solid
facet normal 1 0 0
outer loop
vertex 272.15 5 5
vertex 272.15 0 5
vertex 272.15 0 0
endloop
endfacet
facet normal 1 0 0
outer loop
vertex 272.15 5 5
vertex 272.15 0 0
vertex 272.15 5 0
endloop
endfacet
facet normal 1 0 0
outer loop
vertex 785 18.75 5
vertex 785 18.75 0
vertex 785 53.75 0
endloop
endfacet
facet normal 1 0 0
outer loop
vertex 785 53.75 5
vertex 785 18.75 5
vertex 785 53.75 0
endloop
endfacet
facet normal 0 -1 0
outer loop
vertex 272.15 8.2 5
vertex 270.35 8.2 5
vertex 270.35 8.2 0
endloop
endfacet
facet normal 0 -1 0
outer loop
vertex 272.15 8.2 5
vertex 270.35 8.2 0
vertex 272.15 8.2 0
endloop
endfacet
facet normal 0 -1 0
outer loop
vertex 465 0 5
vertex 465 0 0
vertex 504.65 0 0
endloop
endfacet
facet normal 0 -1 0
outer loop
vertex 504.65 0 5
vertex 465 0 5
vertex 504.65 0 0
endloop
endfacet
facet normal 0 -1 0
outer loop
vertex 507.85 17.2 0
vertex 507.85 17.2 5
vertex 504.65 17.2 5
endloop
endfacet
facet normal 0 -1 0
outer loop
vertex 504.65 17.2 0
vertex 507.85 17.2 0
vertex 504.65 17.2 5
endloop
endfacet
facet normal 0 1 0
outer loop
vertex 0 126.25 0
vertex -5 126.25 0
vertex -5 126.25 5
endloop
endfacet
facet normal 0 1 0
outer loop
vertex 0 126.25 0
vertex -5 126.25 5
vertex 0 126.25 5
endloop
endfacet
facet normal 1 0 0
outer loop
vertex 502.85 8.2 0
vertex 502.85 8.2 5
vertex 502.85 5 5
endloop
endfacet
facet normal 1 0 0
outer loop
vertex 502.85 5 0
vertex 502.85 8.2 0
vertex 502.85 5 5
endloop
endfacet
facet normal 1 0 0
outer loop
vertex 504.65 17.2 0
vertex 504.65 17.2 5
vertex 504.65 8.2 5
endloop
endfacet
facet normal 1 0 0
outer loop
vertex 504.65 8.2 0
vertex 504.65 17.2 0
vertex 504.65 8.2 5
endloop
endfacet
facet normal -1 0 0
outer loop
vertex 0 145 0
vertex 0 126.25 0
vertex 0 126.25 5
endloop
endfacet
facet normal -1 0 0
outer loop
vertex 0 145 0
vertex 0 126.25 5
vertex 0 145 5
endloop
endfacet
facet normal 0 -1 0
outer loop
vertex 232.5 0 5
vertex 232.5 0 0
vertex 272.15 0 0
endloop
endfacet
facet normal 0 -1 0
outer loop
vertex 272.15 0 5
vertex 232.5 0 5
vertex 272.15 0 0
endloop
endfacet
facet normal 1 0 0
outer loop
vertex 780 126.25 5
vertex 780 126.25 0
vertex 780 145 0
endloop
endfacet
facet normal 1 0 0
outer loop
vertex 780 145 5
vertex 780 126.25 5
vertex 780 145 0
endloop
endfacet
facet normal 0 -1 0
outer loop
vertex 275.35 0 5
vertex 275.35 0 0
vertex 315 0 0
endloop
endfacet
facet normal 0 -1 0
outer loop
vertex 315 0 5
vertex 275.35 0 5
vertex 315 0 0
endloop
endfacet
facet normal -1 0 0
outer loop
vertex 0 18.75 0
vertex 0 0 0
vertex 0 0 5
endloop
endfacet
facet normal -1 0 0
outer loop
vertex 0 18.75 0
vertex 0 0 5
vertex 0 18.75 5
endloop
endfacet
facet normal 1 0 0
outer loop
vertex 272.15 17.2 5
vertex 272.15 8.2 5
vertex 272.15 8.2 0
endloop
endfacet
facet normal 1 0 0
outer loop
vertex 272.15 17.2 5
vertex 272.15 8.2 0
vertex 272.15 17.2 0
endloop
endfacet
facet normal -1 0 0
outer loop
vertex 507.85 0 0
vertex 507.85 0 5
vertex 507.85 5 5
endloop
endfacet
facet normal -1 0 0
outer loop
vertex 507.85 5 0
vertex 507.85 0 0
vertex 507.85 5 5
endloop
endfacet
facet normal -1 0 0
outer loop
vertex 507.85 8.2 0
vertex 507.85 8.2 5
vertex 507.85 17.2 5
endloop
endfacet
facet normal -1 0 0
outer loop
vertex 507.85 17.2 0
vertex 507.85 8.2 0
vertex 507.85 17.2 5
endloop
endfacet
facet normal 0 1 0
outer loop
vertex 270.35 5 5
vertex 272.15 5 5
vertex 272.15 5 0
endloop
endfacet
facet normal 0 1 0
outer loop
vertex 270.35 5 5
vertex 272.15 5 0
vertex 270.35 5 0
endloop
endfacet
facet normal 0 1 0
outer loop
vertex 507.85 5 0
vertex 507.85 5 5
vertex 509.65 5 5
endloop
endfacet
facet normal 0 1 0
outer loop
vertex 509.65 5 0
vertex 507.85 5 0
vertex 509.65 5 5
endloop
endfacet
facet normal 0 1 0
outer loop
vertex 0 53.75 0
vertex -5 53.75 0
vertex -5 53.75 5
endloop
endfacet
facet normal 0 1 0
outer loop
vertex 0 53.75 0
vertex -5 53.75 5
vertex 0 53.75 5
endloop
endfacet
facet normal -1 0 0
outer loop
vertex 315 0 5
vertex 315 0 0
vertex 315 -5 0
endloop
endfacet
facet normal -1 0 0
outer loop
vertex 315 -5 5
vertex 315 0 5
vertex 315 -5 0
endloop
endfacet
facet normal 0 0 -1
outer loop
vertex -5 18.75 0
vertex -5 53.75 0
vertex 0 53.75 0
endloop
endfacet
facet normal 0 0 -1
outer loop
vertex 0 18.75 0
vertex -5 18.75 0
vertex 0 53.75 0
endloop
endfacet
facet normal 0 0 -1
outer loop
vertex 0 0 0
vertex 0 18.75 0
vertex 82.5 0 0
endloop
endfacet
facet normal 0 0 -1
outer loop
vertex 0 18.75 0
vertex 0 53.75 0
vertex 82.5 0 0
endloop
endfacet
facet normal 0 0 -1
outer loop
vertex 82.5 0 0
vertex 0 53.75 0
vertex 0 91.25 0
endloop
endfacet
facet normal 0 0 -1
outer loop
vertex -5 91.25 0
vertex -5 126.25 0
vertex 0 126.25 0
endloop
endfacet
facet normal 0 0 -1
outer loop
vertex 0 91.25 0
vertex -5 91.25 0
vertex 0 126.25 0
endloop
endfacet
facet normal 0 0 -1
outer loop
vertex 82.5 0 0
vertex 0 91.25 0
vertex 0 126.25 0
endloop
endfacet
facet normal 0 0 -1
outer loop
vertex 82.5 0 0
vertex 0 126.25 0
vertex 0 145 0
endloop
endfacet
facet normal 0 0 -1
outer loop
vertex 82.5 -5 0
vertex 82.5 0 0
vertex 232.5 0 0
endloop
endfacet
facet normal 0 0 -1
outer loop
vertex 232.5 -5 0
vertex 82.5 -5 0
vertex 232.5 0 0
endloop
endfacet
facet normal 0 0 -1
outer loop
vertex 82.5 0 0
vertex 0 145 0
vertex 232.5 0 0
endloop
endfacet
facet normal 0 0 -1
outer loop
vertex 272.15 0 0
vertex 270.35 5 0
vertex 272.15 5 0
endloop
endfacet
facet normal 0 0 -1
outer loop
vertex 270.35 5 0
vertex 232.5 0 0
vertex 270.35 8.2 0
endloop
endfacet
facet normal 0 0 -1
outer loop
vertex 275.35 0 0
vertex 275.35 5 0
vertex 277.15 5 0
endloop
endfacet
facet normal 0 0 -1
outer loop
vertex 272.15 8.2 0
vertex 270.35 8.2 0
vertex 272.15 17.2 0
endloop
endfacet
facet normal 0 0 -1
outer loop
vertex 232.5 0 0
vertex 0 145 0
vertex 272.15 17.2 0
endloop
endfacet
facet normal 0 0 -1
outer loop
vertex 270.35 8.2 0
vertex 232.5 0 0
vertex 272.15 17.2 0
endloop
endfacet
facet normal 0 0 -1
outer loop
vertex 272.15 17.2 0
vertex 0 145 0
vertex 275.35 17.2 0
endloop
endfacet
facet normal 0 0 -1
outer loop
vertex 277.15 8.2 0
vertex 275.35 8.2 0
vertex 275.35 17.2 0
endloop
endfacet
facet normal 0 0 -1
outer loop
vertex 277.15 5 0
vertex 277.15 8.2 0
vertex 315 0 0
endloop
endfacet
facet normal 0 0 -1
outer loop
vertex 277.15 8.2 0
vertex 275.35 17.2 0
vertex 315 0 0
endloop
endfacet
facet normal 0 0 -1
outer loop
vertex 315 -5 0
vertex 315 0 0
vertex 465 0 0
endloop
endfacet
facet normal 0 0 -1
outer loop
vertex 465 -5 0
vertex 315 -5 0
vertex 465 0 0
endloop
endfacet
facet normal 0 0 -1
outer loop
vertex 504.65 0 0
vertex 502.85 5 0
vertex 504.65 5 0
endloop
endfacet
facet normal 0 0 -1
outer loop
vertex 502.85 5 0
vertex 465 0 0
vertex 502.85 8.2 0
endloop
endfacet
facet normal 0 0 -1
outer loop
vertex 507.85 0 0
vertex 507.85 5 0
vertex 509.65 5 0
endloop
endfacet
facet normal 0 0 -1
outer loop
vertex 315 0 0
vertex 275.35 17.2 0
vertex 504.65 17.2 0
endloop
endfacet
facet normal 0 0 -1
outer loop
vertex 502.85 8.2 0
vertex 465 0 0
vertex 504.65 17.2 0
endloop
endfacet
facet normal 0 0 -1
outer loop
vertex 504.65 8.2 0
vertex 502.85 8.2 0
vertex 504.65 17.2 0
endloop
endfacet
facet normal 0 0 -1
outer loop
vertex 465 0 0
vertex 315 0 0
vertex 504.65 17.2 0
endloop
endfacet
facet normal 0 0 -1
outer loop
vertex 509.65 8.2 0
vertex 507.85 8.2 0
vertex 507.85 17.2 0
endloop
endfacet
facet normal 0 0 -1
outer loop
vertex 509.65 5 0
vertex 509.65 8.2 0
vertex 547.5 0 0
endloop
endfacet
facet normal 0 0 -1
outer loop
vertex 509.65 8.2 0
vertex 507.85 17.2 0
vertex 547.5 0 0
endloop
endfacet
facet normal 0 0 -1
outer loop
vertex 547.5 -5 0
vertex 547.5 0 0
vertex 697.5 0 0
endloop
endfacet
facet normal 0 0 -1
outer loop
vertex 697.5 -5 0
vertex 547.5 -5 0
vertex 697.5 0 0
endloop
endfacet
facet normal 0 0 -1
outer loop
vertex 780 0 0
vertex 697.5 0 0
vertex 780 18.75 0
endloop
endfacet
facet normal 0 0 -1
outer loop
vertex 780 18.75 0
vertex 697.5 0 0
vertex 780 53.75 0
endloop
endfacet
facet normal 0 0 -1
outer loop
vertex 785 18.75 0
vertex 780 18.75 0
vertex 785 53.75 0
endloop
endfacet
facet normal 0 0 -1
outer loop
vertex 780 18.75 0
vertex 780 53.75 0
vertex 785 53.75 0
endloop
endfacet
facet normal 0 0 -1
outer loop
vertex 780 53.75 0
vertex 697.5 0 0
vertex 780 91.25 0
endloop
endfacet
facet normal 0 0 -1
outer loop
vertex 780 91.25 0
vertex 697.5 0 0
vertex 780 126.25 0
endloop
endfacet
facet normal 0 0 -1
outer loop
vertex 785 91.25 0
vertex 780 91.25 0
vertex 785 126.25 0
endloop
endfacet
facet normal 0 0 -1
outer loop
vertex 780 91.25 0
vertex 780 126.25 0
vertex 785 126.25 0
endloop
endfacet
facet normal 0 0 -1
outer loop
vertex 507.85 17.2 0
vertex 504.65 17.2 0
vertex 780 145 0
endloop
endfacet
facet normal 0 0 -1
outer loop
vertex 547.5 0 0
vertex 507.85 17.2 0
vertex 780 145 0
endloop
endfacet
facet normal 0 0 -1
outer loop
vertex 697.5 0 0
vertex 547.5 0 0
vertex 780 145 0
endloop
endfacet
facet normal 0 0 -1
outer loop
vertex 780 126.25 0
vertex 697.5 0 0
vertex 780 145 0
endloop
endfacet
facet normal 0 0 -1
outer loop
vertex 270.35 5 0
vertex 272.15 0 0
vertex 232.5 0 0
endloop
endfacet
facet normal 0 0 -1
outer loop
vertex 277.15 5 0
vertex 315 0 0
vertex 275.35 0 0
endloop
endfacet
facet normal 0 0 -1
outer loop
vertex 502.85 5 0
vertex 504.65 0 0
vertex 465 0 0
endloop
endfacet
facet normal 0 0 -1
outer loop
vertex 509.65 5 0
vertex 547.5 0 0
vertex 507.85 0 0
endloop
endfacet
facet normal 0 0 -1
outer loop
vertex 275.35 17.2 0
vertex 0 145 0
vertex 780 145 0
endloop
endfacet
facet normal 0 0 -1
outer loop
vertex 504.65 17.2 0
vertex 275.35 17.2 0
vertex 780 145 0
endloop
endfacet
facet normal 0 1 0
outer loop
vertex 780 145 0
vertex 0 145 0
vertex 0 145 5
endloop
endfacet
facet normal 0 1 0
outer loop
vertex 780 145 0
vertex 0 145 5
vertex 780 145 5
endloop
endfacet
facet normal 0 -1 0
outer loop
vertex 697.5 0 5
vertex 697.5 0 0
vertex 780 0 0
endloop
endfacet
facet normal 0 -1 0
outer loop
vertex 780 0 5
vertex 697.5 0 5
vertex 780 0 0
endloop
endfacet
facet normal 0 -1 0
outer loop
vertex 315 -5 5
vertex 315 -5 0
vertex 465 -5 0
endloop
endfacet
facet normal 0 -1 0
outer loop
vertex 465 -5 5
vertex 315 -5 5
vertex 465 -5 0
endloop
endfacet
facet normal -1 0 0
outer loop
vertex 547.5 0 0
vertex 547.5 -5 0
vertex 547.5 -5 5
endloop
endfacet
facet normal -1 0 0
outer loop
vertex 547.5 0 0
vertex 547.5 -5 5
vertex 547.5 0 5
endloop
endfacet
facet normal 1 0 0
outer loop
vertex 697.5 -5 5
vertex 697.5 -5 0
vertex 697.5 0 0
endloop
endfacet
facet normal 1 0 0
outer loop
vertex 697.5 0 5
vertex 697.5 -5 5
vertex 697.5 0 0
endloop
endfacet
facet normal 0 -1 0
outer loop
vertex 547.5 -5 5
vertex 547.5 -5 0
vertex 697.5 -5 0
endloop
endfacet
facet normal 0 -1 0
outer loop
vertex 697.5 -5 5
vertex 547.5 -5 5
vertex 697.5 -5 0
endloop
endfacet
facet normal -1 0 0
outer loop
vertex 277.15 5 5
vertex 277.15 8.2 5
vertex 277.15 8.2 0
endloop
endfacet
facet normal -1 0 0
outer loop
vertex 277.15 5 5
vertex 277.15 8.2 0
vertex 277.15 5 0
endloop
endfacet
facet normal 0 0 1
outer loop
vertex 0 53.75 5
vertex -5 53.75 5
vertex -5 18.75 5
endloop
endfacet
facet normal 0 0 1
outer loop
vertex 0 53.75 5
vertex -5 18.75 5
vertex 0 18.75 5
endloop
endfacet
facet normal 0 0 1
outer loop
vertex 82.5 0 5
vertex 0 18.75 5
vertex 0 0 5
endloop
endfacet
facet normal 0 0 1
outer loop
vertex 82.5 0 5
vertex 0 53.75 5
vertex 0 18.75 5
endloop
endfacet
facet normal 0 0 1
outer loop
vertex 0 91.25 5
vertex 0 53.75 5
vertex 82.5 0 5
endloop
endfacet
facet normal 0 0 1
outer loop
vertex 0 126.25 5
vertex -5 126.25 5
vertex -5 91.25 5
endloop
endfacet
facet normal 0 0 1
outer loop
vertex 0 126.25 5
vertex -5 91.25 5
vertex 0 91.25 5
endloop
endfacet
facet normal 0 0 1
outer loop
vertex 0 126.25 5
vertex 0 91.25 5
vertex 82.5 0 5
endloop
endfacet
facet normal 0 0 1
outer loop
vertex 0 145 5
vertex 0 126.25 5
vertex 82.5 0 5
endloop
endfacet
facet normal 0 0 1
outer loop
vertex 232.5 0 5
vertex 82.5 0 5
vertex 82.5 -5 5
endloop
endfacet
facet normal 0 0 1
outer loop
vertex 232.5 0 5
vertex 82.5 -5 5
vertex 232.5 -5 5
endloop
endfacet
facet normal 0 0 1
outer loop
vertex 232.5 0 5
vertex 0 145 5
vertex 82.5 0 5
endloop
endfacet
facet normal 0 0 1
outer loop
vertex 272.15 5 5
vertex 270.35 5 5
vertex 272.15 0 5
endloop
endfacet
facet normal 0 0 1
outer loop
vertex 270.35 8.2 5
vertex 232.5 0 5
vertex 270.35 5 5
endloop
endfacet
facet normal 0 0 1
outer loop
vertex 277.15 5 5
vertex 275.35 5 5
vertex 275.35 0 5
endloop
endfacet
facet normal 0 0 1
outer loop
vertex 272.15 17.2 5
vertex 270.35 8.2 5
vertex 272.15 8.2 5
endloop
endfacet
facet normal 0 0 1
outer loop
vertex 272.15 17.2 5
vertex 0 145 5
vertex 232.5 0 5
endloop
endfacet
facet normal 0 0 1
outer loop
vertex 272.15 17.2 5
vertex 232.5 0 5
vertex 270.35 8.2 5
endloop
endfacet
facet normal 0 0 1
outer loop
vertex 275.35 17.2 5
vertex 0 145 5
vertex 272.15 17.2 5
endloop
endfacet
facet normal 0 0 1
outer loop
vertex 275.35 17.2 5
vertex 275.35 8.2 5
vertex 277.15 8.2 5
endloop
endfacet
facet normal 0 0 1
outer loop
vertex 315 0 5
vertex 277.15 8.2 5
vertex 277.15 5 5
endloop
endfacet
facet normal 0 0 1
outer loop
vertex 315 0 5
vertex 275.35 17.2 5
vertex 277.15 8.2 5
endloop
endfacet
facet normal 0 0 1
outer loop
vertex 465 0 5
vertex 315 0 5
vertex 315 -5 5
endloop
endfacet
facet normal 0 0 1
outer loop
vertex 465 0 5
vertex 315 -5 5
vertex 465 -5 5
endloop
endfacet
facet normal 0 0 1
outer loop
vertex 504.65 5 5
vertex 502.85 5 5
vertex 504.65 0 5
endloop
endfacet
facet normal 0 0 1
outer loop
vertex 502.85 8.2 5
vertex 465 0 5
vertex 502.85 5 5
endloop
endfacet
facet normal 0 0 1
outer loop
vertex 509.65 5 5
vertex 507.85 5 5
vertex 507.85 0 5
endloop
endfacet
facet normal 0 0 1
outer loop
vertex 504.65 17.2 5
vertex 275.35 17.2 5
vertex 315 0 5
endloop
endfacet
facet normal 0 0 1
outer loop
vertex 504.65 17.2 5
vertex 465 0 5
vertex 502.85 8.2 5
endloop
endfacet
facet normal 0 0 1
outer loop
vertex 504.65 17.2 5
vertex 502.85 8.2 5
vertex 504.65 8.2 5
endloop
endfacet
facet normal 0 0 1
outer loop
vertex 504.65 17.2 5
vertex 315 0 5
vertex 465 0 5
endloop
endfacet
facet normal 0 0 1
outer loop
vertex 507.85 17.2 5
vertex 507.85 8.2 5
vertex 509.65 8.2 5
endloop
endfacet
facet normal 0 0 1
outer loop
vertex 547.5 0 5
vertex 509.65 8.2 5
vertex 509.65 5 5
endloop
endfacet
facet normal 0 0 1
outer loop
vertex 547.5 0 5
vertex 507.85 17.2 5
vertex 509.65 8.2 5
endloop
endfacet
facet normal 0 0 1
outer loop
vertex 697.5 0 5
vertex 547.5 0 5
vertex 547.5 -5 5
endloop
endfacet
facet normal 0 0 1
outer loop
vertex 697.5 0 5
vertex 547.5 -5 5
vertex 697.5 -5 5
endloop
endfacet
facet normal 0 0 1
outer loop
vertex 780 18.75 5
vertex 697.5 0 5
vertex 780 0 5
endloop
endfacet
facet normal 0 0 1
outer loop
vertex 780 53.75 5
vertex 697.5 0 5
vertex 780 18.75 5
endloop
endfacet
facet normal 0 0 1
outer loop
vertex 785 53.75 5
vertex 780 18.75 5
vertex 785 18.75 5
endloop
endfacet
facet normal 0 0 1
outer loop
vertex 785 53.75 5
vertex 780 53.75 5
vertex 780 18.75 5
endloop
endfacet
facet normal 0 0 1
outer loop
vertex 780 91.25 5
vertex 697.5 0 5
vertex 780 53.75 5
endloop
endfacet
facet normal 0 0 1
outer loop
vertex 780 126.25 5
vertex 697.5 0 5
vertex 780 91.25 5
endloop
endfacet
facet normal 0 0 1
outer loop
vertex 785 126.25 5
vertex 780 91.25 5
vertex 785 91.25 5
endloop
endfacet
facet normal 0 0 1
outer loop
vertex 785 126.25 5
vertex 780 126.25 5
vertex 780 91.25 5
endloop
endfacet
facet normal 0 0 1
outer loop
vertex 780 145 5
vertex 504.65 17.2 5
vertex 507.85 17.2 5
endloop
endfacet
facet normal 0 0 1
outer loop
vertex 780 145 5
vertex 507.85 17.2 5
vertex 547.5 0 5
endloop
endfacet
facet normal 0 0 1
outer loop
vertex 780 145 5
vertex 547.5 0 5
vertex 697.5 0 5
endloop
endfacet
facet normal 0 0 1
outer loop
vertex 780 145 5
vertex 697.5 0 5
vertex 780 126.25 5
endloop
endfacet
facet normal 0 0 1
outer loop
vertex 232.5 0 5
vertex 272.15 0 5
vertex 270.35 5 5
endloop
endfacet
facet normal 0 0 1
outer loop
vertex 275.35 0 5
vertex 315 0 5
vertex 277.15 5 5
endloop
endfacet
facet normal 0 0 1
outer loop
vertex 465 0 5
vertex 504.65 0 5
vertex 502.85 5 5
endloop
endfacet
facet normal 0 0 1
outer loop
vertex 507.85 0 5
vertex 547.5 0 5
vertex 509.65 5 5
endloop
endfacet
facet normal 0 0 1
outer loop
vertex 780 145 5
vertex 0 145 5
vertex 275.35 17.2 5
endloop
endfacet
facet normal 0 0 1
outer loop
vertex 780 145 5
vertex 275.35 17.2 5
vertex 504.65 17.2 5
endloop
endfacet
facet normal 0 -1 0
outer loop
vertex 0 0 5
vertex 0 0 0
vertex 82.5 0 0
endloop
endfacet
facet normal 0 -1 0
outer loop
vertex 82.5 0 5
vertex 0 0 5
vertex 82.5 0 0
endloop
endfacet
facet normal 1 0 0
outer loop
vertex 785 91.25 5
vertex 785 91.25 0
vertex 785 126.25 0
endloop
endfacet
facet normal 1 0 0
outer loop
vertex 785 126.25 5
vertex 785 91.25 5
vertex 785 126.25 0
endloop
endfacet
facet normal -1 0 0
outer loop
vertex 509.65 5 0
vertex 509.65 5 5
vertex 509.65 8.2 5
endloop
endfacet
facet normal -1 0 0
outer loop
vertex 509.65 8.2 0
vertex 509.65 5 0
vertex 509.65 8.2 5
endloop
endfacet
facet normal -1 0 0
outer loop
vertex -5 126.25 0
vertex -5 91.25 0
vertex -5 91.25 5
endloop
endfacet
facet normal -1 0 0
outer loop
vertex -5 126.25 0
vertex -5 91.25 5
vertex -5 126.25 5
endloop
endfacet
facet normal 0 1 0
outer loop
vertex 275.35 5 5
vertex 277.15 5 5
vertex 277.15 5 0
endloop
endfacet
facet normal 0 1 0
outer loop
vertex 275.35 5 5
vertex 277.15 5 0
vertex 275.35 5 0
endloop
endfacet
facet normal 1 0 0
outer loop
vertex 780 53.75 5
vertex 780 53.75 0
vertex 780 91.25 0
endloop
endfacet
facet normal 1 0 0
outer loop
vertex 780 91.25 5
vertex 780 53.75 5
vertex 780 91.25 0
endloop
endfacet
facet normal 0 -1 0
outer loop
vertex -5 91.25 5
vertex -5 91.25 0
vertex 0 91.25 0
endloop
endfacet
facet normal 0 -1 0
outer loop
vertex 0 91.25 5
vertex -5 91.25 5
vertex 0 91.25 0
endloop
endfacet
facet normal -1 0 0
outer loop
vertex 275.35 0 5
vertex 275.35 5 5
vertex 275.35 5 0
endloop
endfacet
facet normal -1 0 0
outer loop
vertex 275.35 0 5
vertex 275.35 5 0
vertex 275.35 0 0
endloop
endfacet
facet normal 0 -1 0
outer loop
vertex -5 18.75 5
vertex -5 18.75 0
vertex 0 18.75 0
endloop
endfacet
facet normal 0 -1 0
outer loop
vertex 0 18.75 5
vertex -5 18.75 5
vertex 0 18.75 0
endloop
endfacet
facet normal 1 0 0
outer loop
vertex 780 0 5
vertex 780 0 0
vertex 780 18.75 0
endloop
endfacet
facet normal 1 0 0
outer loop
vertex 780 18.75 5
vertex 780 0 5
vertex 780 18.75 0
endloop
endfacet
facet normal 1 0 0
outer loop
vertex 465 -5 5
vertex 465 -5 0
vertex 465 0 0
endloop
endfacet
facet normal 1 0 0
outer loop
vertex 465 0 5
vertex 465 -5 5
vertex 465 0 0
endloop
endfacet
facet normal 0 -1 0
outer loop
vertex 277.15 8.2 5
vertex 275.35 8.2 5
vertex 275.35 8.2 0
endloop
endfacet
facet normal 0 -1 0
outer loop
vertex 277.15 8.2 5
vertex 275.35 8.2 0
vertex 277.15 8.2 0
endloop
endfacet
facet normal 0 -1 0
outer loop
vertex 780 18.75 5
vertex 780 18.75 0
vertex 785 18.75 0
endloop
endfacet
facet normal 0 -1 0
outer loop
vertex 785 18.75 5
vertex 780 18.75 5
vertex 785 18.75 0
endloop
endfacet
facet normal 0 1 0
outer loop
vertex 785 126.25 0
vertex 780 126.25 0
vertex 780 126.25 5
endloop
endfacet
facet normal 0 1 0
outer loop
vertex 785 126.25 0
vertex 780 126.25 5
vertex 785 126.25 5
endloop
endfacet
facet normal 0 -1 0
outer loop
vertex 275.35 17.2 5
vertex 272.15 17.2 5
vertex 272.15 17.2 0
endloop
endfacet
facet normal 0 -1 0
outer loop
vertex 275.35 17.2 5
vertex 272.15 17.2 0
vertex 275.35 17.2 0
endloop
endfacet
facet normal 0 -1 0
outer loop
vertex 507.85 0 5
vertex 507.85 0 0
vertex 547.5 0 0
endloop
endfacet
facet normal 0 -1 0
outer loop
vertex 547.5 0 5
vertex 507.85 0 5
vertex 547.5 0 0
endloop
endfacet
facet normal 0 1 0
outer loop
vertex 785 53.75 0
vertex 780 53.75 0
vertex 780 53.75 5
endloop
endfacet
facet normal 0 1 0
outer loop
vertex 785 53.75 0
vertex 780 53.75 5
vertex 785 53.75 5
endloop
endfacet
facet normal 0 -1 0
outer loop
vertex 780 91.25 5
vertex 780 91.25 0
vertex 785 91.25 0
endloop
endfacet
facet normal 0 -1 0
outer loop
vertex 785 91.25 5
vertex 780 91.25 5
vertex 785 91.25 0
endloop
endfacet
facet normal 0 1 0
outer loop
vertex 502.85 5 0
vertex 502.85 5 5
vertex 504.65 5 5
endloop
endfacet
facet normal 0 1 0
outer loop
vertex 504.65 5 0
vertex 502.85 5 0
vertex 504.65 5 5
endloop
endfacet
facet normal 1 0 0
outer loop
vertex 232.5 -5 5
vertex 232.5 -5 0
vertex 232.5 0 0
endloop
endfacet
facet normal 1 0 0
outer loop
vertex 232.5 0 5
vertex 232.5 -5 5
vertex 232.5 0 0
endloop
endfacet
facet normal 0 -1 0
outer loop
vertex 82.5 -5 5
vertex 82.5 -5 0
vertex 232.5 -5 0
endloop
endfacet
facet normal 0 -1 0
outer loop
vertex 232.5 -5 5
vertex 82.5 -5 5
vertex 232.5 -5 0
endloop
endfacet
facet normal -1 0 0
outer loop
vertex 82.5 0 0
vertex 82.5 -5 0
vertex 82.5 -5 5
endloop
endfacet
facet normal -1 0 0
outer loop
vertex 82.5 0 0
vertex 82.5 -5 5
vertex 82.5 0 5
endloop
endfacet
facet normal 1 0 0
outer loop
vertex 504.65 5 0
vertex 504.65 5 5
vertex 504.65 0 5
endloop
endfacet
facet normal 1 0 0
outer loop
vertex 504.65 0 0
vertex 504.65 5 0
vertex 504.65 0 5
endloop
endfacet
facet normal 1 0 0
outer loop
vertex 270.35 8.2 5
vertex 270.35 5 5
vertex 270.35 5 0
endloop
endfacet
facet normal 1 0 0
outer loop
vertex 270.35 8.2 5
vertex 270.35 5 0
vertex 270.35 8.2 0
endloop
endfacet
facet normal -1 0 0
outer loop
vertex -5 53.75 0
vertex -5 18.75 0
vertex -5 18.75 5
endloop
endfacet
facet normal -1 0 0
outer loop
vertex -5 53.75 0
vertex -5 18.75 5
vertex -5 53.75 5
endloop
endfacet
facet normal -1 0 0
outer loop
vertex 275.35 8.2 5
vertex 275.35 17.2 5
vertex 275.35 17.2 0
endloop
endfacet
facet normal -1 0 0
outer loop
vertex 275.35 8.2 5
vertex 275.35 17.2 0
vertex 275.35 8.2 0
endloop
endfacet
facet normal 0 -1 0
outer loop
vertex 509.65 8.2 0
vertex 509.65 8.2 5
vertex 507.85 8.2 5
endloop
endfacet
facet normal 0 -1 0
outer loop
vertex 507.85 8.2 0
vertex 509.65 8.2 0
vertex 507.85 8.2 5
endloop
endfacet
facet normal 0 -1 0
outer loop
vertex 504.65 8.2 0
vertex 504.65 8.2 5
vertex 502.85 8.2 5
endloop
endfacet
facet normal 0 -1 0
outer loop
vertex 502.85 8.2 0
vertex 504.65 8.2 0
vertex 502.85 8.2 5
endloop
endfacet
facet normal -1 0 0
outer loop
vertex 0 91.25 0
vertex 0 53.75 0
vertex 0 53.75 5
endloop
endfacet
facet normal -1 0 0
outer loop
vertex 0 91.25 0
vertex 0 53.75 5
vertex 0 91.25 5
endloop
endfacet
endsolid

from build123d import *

# Parameters (mm, degrees)
CROQUIS1_W              = 780
CROQUIS1_H              = 145
CROQUIS1_W_2            = 150
CROQUIS1_H_2            = 5
CROQUIS1_W_3            = 5
CROQUIS1_H_3            = 35
SALIENTE_EXTRUIR1_DEPTH = 5
CORTAR_EXTRUIR1_DEPTH   = 10


with BuildPart() as part:
    # Croquis1 → Saliente-Extruir1 (new body)
    with BuildSketch(Plane.XY):
        with Locations((390, 72.5)):
            Rectangle(CROQUIS1_W, CROQUIS1_H)
        with Locations((622.5, -2.5)):
            Rectangle(CROQUIS1_W_2, CROQUIS1_H_2)
        Polygon((390, 0), (315, 0), (315, -5), (465, -5), (465, 0), align=None)
        with Locations((157.5, -2.5)):
            Rectangle(CROQUIS1_W_2, CROQUIS1_H_2)
        with Locations((-2.5, 36.25)):
            Rectangle(CROQUIS1_W_3, CROQUIS1_H_3)
        with Locations((782.5, 36.25)):
            Rectangle(CROQUIS1_W_3, CROQUIS1_H_3)
        with Locations((782.5, 108.75)):
            Rectangle(CROQUIS1_W_3, CROQUIS1_H_3)
        with Locations((-2.5, 108.75)):
            Rectangle(CROQUIS1_W_3, CROQUIS1_H_3)
    extrude(amount=SALIENTE_EXTRUIR1_DEPTH)

    # Croquis2 → Cortar-Extruir1 (cut)
    with BuildSketch(Plane.XY.offset(5)):
        Polygon((275.35, 0), (272.15, 0), (272.15, 5), (270.35, 5), (270.35, 8.2), (272.15, 8.2), (272.15, 17.2), (275.35, 17.2), (275.35, 8.2), (277.15, 8.2), (277.15, 5), (275.35, 5), align=None)
        Polygon((507.85, 8.2), (507.85, 17.2), (504.65, 17.2), (504.65, 8.2), (502.85, 8.2), (502.85, 5), (504.65, 5), (504.65, 0), (507.85, 0), (507.85, 5), (509.65, 5), (509.65, 8.2), align=None)
    extrude(amount=-CORTAR_EXTRUIR1_DEPTH, mode=Mode.SUBTRACT)


solid = part.part
